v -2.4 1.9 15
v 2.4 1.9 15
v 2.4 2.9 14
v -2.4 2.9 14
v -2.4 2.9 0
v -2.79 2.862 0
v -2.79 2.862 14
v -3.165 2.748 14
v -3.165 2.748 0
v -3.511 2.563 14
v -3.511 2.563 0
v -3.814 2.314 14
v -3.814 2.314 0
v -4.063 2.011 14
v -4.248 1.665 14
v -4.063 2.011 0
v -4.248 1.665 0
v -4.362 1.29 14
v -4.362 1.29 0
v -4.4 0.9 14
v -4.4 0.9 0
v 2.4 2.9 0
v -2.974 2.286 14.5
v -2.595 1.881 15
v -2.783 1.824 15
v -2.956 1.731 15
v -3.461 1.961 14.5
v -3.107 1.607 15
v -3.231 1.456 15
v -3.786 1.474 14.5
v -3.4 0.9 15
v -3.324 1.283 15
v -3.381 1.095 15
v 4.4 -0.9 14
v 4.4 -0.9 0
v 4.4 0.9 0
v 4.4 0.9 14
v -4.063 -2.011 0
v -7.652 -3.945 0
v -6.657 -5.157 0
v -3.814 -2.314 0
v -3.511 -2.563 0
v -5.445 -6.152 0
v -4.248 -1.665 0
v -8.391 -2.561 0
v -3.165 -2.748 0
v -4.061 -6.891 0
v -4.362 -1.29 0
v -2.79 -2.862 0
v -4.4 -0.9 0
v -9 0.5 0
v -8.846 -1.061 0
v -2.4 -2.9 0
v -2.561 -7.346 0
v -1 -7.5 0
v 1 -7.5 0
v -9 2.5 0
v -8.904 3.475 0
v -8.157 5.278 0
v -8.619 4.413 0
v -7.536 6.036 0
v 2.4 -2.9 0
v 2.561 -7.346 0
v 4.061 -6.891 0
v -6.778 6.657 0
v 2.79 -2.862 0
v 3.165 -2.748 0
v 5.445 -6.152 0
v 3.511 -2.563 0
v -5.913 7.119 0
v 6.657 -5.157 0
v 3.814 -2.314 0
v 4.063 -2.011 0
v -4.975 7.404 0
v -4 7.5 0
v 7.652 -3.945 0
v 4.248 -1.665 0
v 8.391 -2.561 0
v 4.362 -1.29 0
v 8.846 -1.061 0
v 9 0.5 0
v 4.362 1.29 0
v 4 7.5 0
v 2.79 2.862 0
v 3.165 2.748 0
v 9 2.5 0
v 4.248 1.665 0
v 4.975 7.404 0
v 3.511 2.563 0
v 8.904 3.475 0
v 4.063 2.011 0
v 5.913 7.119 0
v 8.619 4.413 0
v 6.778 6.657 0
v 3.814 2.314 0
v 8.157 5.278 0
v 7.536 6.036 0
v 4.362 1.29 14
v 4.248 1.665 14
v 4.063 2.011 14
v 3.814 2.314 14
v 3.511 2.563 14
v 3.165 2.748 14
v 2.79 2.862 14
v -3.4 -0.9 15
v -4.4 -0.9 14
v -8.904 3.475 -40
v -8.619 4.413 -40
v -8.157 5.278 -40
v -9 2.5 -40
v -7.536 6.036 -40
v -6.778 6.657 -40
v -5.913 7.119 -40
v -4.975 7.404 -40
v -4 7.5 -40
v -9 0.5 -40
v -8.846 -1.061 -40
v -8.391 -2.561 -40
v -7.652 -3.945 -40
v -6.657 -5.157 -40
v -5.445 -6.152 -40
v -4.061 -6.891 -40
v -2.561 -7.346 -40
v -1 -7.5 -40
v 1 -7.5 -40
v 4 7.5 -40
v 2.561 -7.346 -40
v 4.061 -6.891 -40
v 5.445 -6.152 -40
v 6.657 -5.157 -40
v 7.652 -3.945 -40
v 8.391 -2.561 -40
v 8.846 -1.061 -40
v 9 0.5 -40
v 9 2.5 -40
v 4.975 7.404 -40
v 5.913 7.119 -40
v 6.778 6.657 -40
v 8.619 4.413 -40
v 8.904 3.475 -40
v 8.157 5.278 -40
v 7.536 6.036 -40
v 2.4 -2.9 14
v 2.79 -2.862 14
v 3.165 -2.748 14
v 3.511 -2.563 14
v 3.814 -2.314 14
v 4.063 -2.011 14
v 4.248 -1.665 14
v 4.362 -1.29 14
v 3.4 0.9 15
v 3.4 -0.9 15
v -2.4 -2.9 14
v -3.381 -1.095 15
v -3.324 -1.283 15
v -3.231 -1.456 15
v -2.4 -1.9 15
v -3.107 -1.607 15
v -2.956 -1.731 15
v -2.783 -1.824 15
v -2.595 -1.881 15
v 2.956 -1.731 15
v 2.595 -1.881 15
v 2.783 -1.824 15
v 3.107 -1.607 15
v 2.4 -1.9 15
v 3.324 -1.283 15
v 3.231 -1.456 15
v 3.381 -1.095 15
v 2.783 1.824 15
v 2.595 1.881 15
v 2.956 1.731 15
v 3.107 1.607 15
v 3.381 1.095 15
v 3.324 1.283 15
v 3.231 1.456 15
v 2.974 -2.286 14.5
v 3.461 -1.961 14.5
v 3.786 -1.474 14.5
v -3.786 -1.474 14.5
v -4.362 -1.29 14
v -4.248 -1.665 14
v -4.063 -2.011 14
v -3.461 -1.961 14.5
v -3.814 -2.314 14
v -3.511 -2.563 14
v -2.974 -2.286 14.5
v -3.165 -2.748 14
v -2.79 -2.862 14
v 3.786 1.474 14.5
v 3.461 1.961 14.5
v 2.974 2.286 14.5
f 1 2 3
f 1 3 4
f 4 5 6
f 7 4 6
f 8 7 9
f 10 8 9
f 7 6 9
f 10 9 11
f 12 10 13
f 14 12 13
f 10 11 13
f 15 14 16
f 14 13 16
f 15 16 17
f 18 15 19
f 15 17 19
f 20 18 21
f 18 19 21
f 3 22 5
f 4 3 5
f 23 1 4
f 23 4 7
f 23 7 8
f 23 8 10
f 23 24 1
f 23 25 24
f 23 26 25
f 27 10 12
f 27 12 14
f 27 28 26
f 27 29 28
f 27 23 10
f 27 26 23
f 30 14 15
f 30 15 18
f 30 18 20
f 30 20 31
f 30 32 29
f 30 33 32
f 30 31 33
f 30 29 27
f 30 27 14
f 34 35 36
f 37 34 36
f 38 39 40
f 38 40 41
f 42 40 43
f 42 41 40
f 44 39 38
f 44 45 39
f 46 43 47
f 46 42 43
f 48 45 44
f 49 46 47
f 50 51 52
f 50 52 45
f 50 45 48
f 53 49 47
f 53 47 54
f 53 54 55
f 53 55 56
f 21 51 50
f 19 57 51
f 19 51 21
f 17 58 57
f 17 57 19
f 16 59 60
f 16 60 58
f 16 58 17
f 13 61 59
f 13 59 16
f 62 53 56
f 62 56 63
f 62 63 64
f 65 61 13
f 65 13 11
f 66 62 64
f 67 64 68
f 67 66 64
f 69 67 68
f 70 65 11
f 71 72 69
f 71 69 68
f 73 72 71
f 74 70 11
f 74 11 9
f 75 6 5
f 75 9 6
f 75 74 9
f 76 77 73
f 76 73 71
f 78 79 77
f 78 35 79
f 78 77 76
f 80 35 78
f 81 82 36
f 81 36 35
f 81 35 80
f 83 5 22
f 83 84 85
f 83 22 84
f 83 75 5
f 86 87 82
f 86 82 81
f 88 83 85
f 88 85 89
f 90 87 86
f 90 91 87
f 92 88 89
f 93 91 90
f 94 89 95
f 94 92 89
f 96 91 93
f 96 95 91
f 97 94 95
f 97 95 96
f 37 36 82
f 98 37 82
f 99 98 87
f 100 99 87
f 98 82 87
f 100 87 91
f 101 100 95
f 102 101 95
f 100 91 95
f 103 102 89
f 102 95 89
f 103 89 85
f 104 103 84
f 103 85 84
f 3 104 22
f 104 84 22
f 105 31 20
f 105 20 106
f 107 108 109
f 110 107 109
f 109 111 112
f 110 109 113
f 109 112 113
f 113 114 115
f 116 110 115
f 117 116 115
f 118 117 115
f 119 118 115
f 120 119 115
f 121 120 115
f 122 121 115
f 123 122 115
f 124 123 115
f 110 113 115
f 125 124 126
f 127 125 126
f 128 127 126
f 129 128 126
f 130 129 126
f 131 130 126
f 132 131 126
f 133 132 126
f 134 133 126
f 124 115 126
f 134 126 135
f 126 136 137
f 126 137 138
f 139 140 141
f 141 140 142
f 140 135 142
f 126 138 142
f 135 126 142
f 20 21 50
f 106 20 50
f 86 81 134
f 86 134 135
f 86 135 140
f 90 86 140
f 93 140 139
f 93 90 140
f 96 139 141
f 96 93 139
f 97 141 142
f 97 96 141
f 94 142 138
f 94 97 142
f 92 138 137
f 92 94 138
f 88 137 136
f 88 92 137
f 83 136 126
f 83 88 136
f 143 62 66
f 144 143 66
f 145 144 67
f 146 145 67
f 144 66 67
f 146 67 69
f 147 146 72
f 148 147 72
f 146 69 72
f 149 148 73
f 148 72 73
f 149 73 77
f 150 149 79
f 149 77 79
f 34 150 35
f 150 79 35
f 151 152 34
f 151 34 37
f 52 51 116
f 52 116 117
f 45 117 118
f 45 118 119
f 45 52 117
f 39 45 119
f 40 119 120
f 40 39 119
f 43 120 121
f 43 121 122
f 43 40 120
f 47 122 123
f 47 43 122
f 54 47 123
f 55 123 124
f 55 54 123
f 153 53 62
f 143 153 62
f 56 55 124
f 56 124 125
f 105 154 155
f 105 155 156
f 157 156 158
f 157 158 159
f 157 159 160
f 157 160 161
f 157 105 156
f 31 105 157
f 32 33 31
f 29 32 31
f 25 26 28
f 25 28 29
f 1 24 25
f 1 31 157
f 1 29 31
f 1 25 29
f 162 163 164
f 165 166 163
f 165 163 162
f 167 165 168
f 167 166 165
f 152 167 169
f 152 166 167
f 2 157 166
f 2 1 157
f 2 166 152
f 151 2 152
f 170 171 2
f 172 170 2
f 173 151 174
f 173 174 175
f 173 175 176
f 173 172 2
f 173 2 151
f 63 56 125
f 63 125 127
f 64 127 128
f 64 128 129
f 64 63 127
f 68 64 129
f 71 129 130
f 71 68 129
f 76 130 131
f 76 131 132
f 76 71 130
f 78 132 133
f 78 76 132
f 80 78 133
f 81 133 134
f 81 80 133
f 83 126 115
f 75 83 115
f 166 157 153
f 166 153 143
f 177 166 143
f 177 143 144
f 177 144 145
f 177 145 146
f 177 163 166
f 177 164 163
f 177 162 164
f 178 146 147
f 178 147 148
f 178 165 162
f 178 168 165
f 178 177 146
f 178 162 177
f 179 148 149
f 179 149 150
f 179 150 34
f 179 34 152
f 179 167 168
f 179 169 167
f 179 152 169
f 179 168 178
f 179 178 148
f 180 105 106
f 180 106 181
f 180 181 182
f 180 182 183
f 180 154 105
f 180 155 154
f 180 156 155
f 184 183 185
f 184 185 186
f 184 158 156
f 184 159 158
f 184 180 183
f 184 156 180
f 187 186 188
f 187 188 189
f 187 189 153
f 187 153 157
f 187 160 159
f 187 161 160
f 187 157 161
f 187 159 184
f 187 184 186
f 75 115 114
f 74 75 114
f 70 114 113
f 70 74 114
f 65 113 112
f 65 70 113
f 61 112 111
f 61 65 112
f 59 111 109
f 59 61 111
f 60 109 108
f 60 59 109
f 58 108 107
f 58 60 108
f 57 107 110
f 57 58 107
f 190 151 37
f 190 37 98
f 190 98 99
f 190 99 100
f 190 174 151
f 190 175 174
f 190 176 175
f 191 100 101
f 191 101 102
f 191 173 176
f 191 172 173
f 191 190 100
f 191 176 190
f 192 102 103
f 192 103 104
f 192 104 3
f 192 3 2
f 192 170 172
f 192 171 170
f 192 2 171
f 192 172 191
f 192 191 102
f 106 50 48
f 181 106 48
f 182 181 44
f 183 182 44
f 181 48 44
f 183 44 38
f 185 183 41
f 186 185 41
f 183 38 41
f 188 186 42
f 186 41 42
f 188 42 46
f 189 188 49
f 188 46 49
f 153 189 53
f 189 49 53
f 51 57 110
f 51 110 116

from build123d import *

# Parameters (mm, degrees)
F1_DEPTH = 40
F2_DEPTH = 15
F3_SIZE  = 1


with BuildPart() as f1:
    # F0 (on Top) → F1 (new body)
    with BuildSketch(Plane.XY):
        with BuildLine():
            Line((4, 7.5), (-4, 7.5))
            ThreePointArc((-4, 7.5), (-7.5355339059, 6.0355339059), (-9, 2.5))
            Line((-9, 2.5), (-9, 0.5))
            ThreePointArc((-9, 0.5), (-6.6568542495, -5.1568542495), (-1, -7.5))
            Line((-1, -7.5), (1, -7.5))
            ThreePointArc((1, -7.5), (6.6568542495, -5.1568542495), (9, 0.5))
            Line((9, 0.5), (9, 2.5))
            ThreePointArc((9, 2.5), (7.5355339059, 6.0355339059), (4, 7.5))
        make_face()
        with BuildLine():
            ThreePointArc((-4.4, 0.9), (-3.8142135624, 2.3142135624), (-2.4, 2.9))
            Line((-2.4, 2.9), (2.4, 2.9))
            ThreePointArc((2.4, 2.9), (3.8142135624, 2.3142135624), (4.4, 0.9))
            Line((4.4, 0.9), (4.4, -0.9))
            ThreePointArc((4.4, -0.9), (3.8142135624, -2.3142135624), (2.4, -2.9))
            Line((2.4, -2.9), (-2.4, -2.9))
            ThreePointArc((-2.4, -2.9), (-3.8142135624, -2.3142135624), (-4.4, -0.9))
            Line((-4.4, -0.9), (-4.4, 0.9))
        make_face(mode=Mode.SUBTRACT)
        with BuildLine():
            Line((2.4, 2.9), (-2.4, 2.9))
            ThreePointArc((-2.4, 2.9), (-3.8142135624, 2.3142135624), (-4.4, 0.9))
            Line((-4.4, 0.9), (-4.4, -0.9))
            ThreePointArc((-4.4, -0.9), (-3.8142135624, -2.3142135624), (-2.4, -2.9))
            Line((-2.4, -2.9), (2.4, -2.9))
            ThreePointArc((2.4, -2.9), (3.8142135624, -2.3142135624), (4.4, -0.9))
            Line((4.4, -0.9), (4.4, 0.9))
            ThreePointArc((4.4, 0.9), (3.8142135624, 2.3142135624), (2.4, 2.9))
        make_face()
    extrude(amount=-F1_DEPTH)

    # F0 (on Top) → F2 (join)
    with BuildSketch(Plane.XY):
        with BuildLine():
            Line((2.4, 2.9), (-2.4, 2.9))
            ThreePointArc((-2.4, 2.9), (-3.8142135624, 2.3142135624), (-4.4, 0.9))
            Line((-4.4, 0.9), (-4.4, -0.9))
            ThreePointArc((-4.4, -0.9), (-3.8142135624, -2.3142135624), (-2.4, -2.9))
            Line((-2.4, -2.9), (2.4, -2.9))
            ThreePointArc((2.4, -2.9), (3.8142135624, -2.3142135624), (4.4, -0.9))
            Line((4.4, -0.9), (4.4, 0.9))
            ThreePointArc((4.4, 0.9), (3.8142135624, 2.3142135624), (2.4, 2.9))
        make_face()
    extrude(amount=F2_DEPTH)

    # F3
    f3_edges = [f1.edges().sort_by_distance(p)[0] for p in [
        (0, 2.9, 15),
        (-3.814214, 2.314214, 15),
        (-4.4, 0, 15),
        (-3.814214, -2.314214, 15),
        (0, -2.9, 15),
        (3.814214, -2.314214, 15),
        (4.4, 0, 15),
        (3.814214, 2.314214, 15),
    ]]
    chamfer(f3_edges, length=F3_SIZE)


solid = f1.part
